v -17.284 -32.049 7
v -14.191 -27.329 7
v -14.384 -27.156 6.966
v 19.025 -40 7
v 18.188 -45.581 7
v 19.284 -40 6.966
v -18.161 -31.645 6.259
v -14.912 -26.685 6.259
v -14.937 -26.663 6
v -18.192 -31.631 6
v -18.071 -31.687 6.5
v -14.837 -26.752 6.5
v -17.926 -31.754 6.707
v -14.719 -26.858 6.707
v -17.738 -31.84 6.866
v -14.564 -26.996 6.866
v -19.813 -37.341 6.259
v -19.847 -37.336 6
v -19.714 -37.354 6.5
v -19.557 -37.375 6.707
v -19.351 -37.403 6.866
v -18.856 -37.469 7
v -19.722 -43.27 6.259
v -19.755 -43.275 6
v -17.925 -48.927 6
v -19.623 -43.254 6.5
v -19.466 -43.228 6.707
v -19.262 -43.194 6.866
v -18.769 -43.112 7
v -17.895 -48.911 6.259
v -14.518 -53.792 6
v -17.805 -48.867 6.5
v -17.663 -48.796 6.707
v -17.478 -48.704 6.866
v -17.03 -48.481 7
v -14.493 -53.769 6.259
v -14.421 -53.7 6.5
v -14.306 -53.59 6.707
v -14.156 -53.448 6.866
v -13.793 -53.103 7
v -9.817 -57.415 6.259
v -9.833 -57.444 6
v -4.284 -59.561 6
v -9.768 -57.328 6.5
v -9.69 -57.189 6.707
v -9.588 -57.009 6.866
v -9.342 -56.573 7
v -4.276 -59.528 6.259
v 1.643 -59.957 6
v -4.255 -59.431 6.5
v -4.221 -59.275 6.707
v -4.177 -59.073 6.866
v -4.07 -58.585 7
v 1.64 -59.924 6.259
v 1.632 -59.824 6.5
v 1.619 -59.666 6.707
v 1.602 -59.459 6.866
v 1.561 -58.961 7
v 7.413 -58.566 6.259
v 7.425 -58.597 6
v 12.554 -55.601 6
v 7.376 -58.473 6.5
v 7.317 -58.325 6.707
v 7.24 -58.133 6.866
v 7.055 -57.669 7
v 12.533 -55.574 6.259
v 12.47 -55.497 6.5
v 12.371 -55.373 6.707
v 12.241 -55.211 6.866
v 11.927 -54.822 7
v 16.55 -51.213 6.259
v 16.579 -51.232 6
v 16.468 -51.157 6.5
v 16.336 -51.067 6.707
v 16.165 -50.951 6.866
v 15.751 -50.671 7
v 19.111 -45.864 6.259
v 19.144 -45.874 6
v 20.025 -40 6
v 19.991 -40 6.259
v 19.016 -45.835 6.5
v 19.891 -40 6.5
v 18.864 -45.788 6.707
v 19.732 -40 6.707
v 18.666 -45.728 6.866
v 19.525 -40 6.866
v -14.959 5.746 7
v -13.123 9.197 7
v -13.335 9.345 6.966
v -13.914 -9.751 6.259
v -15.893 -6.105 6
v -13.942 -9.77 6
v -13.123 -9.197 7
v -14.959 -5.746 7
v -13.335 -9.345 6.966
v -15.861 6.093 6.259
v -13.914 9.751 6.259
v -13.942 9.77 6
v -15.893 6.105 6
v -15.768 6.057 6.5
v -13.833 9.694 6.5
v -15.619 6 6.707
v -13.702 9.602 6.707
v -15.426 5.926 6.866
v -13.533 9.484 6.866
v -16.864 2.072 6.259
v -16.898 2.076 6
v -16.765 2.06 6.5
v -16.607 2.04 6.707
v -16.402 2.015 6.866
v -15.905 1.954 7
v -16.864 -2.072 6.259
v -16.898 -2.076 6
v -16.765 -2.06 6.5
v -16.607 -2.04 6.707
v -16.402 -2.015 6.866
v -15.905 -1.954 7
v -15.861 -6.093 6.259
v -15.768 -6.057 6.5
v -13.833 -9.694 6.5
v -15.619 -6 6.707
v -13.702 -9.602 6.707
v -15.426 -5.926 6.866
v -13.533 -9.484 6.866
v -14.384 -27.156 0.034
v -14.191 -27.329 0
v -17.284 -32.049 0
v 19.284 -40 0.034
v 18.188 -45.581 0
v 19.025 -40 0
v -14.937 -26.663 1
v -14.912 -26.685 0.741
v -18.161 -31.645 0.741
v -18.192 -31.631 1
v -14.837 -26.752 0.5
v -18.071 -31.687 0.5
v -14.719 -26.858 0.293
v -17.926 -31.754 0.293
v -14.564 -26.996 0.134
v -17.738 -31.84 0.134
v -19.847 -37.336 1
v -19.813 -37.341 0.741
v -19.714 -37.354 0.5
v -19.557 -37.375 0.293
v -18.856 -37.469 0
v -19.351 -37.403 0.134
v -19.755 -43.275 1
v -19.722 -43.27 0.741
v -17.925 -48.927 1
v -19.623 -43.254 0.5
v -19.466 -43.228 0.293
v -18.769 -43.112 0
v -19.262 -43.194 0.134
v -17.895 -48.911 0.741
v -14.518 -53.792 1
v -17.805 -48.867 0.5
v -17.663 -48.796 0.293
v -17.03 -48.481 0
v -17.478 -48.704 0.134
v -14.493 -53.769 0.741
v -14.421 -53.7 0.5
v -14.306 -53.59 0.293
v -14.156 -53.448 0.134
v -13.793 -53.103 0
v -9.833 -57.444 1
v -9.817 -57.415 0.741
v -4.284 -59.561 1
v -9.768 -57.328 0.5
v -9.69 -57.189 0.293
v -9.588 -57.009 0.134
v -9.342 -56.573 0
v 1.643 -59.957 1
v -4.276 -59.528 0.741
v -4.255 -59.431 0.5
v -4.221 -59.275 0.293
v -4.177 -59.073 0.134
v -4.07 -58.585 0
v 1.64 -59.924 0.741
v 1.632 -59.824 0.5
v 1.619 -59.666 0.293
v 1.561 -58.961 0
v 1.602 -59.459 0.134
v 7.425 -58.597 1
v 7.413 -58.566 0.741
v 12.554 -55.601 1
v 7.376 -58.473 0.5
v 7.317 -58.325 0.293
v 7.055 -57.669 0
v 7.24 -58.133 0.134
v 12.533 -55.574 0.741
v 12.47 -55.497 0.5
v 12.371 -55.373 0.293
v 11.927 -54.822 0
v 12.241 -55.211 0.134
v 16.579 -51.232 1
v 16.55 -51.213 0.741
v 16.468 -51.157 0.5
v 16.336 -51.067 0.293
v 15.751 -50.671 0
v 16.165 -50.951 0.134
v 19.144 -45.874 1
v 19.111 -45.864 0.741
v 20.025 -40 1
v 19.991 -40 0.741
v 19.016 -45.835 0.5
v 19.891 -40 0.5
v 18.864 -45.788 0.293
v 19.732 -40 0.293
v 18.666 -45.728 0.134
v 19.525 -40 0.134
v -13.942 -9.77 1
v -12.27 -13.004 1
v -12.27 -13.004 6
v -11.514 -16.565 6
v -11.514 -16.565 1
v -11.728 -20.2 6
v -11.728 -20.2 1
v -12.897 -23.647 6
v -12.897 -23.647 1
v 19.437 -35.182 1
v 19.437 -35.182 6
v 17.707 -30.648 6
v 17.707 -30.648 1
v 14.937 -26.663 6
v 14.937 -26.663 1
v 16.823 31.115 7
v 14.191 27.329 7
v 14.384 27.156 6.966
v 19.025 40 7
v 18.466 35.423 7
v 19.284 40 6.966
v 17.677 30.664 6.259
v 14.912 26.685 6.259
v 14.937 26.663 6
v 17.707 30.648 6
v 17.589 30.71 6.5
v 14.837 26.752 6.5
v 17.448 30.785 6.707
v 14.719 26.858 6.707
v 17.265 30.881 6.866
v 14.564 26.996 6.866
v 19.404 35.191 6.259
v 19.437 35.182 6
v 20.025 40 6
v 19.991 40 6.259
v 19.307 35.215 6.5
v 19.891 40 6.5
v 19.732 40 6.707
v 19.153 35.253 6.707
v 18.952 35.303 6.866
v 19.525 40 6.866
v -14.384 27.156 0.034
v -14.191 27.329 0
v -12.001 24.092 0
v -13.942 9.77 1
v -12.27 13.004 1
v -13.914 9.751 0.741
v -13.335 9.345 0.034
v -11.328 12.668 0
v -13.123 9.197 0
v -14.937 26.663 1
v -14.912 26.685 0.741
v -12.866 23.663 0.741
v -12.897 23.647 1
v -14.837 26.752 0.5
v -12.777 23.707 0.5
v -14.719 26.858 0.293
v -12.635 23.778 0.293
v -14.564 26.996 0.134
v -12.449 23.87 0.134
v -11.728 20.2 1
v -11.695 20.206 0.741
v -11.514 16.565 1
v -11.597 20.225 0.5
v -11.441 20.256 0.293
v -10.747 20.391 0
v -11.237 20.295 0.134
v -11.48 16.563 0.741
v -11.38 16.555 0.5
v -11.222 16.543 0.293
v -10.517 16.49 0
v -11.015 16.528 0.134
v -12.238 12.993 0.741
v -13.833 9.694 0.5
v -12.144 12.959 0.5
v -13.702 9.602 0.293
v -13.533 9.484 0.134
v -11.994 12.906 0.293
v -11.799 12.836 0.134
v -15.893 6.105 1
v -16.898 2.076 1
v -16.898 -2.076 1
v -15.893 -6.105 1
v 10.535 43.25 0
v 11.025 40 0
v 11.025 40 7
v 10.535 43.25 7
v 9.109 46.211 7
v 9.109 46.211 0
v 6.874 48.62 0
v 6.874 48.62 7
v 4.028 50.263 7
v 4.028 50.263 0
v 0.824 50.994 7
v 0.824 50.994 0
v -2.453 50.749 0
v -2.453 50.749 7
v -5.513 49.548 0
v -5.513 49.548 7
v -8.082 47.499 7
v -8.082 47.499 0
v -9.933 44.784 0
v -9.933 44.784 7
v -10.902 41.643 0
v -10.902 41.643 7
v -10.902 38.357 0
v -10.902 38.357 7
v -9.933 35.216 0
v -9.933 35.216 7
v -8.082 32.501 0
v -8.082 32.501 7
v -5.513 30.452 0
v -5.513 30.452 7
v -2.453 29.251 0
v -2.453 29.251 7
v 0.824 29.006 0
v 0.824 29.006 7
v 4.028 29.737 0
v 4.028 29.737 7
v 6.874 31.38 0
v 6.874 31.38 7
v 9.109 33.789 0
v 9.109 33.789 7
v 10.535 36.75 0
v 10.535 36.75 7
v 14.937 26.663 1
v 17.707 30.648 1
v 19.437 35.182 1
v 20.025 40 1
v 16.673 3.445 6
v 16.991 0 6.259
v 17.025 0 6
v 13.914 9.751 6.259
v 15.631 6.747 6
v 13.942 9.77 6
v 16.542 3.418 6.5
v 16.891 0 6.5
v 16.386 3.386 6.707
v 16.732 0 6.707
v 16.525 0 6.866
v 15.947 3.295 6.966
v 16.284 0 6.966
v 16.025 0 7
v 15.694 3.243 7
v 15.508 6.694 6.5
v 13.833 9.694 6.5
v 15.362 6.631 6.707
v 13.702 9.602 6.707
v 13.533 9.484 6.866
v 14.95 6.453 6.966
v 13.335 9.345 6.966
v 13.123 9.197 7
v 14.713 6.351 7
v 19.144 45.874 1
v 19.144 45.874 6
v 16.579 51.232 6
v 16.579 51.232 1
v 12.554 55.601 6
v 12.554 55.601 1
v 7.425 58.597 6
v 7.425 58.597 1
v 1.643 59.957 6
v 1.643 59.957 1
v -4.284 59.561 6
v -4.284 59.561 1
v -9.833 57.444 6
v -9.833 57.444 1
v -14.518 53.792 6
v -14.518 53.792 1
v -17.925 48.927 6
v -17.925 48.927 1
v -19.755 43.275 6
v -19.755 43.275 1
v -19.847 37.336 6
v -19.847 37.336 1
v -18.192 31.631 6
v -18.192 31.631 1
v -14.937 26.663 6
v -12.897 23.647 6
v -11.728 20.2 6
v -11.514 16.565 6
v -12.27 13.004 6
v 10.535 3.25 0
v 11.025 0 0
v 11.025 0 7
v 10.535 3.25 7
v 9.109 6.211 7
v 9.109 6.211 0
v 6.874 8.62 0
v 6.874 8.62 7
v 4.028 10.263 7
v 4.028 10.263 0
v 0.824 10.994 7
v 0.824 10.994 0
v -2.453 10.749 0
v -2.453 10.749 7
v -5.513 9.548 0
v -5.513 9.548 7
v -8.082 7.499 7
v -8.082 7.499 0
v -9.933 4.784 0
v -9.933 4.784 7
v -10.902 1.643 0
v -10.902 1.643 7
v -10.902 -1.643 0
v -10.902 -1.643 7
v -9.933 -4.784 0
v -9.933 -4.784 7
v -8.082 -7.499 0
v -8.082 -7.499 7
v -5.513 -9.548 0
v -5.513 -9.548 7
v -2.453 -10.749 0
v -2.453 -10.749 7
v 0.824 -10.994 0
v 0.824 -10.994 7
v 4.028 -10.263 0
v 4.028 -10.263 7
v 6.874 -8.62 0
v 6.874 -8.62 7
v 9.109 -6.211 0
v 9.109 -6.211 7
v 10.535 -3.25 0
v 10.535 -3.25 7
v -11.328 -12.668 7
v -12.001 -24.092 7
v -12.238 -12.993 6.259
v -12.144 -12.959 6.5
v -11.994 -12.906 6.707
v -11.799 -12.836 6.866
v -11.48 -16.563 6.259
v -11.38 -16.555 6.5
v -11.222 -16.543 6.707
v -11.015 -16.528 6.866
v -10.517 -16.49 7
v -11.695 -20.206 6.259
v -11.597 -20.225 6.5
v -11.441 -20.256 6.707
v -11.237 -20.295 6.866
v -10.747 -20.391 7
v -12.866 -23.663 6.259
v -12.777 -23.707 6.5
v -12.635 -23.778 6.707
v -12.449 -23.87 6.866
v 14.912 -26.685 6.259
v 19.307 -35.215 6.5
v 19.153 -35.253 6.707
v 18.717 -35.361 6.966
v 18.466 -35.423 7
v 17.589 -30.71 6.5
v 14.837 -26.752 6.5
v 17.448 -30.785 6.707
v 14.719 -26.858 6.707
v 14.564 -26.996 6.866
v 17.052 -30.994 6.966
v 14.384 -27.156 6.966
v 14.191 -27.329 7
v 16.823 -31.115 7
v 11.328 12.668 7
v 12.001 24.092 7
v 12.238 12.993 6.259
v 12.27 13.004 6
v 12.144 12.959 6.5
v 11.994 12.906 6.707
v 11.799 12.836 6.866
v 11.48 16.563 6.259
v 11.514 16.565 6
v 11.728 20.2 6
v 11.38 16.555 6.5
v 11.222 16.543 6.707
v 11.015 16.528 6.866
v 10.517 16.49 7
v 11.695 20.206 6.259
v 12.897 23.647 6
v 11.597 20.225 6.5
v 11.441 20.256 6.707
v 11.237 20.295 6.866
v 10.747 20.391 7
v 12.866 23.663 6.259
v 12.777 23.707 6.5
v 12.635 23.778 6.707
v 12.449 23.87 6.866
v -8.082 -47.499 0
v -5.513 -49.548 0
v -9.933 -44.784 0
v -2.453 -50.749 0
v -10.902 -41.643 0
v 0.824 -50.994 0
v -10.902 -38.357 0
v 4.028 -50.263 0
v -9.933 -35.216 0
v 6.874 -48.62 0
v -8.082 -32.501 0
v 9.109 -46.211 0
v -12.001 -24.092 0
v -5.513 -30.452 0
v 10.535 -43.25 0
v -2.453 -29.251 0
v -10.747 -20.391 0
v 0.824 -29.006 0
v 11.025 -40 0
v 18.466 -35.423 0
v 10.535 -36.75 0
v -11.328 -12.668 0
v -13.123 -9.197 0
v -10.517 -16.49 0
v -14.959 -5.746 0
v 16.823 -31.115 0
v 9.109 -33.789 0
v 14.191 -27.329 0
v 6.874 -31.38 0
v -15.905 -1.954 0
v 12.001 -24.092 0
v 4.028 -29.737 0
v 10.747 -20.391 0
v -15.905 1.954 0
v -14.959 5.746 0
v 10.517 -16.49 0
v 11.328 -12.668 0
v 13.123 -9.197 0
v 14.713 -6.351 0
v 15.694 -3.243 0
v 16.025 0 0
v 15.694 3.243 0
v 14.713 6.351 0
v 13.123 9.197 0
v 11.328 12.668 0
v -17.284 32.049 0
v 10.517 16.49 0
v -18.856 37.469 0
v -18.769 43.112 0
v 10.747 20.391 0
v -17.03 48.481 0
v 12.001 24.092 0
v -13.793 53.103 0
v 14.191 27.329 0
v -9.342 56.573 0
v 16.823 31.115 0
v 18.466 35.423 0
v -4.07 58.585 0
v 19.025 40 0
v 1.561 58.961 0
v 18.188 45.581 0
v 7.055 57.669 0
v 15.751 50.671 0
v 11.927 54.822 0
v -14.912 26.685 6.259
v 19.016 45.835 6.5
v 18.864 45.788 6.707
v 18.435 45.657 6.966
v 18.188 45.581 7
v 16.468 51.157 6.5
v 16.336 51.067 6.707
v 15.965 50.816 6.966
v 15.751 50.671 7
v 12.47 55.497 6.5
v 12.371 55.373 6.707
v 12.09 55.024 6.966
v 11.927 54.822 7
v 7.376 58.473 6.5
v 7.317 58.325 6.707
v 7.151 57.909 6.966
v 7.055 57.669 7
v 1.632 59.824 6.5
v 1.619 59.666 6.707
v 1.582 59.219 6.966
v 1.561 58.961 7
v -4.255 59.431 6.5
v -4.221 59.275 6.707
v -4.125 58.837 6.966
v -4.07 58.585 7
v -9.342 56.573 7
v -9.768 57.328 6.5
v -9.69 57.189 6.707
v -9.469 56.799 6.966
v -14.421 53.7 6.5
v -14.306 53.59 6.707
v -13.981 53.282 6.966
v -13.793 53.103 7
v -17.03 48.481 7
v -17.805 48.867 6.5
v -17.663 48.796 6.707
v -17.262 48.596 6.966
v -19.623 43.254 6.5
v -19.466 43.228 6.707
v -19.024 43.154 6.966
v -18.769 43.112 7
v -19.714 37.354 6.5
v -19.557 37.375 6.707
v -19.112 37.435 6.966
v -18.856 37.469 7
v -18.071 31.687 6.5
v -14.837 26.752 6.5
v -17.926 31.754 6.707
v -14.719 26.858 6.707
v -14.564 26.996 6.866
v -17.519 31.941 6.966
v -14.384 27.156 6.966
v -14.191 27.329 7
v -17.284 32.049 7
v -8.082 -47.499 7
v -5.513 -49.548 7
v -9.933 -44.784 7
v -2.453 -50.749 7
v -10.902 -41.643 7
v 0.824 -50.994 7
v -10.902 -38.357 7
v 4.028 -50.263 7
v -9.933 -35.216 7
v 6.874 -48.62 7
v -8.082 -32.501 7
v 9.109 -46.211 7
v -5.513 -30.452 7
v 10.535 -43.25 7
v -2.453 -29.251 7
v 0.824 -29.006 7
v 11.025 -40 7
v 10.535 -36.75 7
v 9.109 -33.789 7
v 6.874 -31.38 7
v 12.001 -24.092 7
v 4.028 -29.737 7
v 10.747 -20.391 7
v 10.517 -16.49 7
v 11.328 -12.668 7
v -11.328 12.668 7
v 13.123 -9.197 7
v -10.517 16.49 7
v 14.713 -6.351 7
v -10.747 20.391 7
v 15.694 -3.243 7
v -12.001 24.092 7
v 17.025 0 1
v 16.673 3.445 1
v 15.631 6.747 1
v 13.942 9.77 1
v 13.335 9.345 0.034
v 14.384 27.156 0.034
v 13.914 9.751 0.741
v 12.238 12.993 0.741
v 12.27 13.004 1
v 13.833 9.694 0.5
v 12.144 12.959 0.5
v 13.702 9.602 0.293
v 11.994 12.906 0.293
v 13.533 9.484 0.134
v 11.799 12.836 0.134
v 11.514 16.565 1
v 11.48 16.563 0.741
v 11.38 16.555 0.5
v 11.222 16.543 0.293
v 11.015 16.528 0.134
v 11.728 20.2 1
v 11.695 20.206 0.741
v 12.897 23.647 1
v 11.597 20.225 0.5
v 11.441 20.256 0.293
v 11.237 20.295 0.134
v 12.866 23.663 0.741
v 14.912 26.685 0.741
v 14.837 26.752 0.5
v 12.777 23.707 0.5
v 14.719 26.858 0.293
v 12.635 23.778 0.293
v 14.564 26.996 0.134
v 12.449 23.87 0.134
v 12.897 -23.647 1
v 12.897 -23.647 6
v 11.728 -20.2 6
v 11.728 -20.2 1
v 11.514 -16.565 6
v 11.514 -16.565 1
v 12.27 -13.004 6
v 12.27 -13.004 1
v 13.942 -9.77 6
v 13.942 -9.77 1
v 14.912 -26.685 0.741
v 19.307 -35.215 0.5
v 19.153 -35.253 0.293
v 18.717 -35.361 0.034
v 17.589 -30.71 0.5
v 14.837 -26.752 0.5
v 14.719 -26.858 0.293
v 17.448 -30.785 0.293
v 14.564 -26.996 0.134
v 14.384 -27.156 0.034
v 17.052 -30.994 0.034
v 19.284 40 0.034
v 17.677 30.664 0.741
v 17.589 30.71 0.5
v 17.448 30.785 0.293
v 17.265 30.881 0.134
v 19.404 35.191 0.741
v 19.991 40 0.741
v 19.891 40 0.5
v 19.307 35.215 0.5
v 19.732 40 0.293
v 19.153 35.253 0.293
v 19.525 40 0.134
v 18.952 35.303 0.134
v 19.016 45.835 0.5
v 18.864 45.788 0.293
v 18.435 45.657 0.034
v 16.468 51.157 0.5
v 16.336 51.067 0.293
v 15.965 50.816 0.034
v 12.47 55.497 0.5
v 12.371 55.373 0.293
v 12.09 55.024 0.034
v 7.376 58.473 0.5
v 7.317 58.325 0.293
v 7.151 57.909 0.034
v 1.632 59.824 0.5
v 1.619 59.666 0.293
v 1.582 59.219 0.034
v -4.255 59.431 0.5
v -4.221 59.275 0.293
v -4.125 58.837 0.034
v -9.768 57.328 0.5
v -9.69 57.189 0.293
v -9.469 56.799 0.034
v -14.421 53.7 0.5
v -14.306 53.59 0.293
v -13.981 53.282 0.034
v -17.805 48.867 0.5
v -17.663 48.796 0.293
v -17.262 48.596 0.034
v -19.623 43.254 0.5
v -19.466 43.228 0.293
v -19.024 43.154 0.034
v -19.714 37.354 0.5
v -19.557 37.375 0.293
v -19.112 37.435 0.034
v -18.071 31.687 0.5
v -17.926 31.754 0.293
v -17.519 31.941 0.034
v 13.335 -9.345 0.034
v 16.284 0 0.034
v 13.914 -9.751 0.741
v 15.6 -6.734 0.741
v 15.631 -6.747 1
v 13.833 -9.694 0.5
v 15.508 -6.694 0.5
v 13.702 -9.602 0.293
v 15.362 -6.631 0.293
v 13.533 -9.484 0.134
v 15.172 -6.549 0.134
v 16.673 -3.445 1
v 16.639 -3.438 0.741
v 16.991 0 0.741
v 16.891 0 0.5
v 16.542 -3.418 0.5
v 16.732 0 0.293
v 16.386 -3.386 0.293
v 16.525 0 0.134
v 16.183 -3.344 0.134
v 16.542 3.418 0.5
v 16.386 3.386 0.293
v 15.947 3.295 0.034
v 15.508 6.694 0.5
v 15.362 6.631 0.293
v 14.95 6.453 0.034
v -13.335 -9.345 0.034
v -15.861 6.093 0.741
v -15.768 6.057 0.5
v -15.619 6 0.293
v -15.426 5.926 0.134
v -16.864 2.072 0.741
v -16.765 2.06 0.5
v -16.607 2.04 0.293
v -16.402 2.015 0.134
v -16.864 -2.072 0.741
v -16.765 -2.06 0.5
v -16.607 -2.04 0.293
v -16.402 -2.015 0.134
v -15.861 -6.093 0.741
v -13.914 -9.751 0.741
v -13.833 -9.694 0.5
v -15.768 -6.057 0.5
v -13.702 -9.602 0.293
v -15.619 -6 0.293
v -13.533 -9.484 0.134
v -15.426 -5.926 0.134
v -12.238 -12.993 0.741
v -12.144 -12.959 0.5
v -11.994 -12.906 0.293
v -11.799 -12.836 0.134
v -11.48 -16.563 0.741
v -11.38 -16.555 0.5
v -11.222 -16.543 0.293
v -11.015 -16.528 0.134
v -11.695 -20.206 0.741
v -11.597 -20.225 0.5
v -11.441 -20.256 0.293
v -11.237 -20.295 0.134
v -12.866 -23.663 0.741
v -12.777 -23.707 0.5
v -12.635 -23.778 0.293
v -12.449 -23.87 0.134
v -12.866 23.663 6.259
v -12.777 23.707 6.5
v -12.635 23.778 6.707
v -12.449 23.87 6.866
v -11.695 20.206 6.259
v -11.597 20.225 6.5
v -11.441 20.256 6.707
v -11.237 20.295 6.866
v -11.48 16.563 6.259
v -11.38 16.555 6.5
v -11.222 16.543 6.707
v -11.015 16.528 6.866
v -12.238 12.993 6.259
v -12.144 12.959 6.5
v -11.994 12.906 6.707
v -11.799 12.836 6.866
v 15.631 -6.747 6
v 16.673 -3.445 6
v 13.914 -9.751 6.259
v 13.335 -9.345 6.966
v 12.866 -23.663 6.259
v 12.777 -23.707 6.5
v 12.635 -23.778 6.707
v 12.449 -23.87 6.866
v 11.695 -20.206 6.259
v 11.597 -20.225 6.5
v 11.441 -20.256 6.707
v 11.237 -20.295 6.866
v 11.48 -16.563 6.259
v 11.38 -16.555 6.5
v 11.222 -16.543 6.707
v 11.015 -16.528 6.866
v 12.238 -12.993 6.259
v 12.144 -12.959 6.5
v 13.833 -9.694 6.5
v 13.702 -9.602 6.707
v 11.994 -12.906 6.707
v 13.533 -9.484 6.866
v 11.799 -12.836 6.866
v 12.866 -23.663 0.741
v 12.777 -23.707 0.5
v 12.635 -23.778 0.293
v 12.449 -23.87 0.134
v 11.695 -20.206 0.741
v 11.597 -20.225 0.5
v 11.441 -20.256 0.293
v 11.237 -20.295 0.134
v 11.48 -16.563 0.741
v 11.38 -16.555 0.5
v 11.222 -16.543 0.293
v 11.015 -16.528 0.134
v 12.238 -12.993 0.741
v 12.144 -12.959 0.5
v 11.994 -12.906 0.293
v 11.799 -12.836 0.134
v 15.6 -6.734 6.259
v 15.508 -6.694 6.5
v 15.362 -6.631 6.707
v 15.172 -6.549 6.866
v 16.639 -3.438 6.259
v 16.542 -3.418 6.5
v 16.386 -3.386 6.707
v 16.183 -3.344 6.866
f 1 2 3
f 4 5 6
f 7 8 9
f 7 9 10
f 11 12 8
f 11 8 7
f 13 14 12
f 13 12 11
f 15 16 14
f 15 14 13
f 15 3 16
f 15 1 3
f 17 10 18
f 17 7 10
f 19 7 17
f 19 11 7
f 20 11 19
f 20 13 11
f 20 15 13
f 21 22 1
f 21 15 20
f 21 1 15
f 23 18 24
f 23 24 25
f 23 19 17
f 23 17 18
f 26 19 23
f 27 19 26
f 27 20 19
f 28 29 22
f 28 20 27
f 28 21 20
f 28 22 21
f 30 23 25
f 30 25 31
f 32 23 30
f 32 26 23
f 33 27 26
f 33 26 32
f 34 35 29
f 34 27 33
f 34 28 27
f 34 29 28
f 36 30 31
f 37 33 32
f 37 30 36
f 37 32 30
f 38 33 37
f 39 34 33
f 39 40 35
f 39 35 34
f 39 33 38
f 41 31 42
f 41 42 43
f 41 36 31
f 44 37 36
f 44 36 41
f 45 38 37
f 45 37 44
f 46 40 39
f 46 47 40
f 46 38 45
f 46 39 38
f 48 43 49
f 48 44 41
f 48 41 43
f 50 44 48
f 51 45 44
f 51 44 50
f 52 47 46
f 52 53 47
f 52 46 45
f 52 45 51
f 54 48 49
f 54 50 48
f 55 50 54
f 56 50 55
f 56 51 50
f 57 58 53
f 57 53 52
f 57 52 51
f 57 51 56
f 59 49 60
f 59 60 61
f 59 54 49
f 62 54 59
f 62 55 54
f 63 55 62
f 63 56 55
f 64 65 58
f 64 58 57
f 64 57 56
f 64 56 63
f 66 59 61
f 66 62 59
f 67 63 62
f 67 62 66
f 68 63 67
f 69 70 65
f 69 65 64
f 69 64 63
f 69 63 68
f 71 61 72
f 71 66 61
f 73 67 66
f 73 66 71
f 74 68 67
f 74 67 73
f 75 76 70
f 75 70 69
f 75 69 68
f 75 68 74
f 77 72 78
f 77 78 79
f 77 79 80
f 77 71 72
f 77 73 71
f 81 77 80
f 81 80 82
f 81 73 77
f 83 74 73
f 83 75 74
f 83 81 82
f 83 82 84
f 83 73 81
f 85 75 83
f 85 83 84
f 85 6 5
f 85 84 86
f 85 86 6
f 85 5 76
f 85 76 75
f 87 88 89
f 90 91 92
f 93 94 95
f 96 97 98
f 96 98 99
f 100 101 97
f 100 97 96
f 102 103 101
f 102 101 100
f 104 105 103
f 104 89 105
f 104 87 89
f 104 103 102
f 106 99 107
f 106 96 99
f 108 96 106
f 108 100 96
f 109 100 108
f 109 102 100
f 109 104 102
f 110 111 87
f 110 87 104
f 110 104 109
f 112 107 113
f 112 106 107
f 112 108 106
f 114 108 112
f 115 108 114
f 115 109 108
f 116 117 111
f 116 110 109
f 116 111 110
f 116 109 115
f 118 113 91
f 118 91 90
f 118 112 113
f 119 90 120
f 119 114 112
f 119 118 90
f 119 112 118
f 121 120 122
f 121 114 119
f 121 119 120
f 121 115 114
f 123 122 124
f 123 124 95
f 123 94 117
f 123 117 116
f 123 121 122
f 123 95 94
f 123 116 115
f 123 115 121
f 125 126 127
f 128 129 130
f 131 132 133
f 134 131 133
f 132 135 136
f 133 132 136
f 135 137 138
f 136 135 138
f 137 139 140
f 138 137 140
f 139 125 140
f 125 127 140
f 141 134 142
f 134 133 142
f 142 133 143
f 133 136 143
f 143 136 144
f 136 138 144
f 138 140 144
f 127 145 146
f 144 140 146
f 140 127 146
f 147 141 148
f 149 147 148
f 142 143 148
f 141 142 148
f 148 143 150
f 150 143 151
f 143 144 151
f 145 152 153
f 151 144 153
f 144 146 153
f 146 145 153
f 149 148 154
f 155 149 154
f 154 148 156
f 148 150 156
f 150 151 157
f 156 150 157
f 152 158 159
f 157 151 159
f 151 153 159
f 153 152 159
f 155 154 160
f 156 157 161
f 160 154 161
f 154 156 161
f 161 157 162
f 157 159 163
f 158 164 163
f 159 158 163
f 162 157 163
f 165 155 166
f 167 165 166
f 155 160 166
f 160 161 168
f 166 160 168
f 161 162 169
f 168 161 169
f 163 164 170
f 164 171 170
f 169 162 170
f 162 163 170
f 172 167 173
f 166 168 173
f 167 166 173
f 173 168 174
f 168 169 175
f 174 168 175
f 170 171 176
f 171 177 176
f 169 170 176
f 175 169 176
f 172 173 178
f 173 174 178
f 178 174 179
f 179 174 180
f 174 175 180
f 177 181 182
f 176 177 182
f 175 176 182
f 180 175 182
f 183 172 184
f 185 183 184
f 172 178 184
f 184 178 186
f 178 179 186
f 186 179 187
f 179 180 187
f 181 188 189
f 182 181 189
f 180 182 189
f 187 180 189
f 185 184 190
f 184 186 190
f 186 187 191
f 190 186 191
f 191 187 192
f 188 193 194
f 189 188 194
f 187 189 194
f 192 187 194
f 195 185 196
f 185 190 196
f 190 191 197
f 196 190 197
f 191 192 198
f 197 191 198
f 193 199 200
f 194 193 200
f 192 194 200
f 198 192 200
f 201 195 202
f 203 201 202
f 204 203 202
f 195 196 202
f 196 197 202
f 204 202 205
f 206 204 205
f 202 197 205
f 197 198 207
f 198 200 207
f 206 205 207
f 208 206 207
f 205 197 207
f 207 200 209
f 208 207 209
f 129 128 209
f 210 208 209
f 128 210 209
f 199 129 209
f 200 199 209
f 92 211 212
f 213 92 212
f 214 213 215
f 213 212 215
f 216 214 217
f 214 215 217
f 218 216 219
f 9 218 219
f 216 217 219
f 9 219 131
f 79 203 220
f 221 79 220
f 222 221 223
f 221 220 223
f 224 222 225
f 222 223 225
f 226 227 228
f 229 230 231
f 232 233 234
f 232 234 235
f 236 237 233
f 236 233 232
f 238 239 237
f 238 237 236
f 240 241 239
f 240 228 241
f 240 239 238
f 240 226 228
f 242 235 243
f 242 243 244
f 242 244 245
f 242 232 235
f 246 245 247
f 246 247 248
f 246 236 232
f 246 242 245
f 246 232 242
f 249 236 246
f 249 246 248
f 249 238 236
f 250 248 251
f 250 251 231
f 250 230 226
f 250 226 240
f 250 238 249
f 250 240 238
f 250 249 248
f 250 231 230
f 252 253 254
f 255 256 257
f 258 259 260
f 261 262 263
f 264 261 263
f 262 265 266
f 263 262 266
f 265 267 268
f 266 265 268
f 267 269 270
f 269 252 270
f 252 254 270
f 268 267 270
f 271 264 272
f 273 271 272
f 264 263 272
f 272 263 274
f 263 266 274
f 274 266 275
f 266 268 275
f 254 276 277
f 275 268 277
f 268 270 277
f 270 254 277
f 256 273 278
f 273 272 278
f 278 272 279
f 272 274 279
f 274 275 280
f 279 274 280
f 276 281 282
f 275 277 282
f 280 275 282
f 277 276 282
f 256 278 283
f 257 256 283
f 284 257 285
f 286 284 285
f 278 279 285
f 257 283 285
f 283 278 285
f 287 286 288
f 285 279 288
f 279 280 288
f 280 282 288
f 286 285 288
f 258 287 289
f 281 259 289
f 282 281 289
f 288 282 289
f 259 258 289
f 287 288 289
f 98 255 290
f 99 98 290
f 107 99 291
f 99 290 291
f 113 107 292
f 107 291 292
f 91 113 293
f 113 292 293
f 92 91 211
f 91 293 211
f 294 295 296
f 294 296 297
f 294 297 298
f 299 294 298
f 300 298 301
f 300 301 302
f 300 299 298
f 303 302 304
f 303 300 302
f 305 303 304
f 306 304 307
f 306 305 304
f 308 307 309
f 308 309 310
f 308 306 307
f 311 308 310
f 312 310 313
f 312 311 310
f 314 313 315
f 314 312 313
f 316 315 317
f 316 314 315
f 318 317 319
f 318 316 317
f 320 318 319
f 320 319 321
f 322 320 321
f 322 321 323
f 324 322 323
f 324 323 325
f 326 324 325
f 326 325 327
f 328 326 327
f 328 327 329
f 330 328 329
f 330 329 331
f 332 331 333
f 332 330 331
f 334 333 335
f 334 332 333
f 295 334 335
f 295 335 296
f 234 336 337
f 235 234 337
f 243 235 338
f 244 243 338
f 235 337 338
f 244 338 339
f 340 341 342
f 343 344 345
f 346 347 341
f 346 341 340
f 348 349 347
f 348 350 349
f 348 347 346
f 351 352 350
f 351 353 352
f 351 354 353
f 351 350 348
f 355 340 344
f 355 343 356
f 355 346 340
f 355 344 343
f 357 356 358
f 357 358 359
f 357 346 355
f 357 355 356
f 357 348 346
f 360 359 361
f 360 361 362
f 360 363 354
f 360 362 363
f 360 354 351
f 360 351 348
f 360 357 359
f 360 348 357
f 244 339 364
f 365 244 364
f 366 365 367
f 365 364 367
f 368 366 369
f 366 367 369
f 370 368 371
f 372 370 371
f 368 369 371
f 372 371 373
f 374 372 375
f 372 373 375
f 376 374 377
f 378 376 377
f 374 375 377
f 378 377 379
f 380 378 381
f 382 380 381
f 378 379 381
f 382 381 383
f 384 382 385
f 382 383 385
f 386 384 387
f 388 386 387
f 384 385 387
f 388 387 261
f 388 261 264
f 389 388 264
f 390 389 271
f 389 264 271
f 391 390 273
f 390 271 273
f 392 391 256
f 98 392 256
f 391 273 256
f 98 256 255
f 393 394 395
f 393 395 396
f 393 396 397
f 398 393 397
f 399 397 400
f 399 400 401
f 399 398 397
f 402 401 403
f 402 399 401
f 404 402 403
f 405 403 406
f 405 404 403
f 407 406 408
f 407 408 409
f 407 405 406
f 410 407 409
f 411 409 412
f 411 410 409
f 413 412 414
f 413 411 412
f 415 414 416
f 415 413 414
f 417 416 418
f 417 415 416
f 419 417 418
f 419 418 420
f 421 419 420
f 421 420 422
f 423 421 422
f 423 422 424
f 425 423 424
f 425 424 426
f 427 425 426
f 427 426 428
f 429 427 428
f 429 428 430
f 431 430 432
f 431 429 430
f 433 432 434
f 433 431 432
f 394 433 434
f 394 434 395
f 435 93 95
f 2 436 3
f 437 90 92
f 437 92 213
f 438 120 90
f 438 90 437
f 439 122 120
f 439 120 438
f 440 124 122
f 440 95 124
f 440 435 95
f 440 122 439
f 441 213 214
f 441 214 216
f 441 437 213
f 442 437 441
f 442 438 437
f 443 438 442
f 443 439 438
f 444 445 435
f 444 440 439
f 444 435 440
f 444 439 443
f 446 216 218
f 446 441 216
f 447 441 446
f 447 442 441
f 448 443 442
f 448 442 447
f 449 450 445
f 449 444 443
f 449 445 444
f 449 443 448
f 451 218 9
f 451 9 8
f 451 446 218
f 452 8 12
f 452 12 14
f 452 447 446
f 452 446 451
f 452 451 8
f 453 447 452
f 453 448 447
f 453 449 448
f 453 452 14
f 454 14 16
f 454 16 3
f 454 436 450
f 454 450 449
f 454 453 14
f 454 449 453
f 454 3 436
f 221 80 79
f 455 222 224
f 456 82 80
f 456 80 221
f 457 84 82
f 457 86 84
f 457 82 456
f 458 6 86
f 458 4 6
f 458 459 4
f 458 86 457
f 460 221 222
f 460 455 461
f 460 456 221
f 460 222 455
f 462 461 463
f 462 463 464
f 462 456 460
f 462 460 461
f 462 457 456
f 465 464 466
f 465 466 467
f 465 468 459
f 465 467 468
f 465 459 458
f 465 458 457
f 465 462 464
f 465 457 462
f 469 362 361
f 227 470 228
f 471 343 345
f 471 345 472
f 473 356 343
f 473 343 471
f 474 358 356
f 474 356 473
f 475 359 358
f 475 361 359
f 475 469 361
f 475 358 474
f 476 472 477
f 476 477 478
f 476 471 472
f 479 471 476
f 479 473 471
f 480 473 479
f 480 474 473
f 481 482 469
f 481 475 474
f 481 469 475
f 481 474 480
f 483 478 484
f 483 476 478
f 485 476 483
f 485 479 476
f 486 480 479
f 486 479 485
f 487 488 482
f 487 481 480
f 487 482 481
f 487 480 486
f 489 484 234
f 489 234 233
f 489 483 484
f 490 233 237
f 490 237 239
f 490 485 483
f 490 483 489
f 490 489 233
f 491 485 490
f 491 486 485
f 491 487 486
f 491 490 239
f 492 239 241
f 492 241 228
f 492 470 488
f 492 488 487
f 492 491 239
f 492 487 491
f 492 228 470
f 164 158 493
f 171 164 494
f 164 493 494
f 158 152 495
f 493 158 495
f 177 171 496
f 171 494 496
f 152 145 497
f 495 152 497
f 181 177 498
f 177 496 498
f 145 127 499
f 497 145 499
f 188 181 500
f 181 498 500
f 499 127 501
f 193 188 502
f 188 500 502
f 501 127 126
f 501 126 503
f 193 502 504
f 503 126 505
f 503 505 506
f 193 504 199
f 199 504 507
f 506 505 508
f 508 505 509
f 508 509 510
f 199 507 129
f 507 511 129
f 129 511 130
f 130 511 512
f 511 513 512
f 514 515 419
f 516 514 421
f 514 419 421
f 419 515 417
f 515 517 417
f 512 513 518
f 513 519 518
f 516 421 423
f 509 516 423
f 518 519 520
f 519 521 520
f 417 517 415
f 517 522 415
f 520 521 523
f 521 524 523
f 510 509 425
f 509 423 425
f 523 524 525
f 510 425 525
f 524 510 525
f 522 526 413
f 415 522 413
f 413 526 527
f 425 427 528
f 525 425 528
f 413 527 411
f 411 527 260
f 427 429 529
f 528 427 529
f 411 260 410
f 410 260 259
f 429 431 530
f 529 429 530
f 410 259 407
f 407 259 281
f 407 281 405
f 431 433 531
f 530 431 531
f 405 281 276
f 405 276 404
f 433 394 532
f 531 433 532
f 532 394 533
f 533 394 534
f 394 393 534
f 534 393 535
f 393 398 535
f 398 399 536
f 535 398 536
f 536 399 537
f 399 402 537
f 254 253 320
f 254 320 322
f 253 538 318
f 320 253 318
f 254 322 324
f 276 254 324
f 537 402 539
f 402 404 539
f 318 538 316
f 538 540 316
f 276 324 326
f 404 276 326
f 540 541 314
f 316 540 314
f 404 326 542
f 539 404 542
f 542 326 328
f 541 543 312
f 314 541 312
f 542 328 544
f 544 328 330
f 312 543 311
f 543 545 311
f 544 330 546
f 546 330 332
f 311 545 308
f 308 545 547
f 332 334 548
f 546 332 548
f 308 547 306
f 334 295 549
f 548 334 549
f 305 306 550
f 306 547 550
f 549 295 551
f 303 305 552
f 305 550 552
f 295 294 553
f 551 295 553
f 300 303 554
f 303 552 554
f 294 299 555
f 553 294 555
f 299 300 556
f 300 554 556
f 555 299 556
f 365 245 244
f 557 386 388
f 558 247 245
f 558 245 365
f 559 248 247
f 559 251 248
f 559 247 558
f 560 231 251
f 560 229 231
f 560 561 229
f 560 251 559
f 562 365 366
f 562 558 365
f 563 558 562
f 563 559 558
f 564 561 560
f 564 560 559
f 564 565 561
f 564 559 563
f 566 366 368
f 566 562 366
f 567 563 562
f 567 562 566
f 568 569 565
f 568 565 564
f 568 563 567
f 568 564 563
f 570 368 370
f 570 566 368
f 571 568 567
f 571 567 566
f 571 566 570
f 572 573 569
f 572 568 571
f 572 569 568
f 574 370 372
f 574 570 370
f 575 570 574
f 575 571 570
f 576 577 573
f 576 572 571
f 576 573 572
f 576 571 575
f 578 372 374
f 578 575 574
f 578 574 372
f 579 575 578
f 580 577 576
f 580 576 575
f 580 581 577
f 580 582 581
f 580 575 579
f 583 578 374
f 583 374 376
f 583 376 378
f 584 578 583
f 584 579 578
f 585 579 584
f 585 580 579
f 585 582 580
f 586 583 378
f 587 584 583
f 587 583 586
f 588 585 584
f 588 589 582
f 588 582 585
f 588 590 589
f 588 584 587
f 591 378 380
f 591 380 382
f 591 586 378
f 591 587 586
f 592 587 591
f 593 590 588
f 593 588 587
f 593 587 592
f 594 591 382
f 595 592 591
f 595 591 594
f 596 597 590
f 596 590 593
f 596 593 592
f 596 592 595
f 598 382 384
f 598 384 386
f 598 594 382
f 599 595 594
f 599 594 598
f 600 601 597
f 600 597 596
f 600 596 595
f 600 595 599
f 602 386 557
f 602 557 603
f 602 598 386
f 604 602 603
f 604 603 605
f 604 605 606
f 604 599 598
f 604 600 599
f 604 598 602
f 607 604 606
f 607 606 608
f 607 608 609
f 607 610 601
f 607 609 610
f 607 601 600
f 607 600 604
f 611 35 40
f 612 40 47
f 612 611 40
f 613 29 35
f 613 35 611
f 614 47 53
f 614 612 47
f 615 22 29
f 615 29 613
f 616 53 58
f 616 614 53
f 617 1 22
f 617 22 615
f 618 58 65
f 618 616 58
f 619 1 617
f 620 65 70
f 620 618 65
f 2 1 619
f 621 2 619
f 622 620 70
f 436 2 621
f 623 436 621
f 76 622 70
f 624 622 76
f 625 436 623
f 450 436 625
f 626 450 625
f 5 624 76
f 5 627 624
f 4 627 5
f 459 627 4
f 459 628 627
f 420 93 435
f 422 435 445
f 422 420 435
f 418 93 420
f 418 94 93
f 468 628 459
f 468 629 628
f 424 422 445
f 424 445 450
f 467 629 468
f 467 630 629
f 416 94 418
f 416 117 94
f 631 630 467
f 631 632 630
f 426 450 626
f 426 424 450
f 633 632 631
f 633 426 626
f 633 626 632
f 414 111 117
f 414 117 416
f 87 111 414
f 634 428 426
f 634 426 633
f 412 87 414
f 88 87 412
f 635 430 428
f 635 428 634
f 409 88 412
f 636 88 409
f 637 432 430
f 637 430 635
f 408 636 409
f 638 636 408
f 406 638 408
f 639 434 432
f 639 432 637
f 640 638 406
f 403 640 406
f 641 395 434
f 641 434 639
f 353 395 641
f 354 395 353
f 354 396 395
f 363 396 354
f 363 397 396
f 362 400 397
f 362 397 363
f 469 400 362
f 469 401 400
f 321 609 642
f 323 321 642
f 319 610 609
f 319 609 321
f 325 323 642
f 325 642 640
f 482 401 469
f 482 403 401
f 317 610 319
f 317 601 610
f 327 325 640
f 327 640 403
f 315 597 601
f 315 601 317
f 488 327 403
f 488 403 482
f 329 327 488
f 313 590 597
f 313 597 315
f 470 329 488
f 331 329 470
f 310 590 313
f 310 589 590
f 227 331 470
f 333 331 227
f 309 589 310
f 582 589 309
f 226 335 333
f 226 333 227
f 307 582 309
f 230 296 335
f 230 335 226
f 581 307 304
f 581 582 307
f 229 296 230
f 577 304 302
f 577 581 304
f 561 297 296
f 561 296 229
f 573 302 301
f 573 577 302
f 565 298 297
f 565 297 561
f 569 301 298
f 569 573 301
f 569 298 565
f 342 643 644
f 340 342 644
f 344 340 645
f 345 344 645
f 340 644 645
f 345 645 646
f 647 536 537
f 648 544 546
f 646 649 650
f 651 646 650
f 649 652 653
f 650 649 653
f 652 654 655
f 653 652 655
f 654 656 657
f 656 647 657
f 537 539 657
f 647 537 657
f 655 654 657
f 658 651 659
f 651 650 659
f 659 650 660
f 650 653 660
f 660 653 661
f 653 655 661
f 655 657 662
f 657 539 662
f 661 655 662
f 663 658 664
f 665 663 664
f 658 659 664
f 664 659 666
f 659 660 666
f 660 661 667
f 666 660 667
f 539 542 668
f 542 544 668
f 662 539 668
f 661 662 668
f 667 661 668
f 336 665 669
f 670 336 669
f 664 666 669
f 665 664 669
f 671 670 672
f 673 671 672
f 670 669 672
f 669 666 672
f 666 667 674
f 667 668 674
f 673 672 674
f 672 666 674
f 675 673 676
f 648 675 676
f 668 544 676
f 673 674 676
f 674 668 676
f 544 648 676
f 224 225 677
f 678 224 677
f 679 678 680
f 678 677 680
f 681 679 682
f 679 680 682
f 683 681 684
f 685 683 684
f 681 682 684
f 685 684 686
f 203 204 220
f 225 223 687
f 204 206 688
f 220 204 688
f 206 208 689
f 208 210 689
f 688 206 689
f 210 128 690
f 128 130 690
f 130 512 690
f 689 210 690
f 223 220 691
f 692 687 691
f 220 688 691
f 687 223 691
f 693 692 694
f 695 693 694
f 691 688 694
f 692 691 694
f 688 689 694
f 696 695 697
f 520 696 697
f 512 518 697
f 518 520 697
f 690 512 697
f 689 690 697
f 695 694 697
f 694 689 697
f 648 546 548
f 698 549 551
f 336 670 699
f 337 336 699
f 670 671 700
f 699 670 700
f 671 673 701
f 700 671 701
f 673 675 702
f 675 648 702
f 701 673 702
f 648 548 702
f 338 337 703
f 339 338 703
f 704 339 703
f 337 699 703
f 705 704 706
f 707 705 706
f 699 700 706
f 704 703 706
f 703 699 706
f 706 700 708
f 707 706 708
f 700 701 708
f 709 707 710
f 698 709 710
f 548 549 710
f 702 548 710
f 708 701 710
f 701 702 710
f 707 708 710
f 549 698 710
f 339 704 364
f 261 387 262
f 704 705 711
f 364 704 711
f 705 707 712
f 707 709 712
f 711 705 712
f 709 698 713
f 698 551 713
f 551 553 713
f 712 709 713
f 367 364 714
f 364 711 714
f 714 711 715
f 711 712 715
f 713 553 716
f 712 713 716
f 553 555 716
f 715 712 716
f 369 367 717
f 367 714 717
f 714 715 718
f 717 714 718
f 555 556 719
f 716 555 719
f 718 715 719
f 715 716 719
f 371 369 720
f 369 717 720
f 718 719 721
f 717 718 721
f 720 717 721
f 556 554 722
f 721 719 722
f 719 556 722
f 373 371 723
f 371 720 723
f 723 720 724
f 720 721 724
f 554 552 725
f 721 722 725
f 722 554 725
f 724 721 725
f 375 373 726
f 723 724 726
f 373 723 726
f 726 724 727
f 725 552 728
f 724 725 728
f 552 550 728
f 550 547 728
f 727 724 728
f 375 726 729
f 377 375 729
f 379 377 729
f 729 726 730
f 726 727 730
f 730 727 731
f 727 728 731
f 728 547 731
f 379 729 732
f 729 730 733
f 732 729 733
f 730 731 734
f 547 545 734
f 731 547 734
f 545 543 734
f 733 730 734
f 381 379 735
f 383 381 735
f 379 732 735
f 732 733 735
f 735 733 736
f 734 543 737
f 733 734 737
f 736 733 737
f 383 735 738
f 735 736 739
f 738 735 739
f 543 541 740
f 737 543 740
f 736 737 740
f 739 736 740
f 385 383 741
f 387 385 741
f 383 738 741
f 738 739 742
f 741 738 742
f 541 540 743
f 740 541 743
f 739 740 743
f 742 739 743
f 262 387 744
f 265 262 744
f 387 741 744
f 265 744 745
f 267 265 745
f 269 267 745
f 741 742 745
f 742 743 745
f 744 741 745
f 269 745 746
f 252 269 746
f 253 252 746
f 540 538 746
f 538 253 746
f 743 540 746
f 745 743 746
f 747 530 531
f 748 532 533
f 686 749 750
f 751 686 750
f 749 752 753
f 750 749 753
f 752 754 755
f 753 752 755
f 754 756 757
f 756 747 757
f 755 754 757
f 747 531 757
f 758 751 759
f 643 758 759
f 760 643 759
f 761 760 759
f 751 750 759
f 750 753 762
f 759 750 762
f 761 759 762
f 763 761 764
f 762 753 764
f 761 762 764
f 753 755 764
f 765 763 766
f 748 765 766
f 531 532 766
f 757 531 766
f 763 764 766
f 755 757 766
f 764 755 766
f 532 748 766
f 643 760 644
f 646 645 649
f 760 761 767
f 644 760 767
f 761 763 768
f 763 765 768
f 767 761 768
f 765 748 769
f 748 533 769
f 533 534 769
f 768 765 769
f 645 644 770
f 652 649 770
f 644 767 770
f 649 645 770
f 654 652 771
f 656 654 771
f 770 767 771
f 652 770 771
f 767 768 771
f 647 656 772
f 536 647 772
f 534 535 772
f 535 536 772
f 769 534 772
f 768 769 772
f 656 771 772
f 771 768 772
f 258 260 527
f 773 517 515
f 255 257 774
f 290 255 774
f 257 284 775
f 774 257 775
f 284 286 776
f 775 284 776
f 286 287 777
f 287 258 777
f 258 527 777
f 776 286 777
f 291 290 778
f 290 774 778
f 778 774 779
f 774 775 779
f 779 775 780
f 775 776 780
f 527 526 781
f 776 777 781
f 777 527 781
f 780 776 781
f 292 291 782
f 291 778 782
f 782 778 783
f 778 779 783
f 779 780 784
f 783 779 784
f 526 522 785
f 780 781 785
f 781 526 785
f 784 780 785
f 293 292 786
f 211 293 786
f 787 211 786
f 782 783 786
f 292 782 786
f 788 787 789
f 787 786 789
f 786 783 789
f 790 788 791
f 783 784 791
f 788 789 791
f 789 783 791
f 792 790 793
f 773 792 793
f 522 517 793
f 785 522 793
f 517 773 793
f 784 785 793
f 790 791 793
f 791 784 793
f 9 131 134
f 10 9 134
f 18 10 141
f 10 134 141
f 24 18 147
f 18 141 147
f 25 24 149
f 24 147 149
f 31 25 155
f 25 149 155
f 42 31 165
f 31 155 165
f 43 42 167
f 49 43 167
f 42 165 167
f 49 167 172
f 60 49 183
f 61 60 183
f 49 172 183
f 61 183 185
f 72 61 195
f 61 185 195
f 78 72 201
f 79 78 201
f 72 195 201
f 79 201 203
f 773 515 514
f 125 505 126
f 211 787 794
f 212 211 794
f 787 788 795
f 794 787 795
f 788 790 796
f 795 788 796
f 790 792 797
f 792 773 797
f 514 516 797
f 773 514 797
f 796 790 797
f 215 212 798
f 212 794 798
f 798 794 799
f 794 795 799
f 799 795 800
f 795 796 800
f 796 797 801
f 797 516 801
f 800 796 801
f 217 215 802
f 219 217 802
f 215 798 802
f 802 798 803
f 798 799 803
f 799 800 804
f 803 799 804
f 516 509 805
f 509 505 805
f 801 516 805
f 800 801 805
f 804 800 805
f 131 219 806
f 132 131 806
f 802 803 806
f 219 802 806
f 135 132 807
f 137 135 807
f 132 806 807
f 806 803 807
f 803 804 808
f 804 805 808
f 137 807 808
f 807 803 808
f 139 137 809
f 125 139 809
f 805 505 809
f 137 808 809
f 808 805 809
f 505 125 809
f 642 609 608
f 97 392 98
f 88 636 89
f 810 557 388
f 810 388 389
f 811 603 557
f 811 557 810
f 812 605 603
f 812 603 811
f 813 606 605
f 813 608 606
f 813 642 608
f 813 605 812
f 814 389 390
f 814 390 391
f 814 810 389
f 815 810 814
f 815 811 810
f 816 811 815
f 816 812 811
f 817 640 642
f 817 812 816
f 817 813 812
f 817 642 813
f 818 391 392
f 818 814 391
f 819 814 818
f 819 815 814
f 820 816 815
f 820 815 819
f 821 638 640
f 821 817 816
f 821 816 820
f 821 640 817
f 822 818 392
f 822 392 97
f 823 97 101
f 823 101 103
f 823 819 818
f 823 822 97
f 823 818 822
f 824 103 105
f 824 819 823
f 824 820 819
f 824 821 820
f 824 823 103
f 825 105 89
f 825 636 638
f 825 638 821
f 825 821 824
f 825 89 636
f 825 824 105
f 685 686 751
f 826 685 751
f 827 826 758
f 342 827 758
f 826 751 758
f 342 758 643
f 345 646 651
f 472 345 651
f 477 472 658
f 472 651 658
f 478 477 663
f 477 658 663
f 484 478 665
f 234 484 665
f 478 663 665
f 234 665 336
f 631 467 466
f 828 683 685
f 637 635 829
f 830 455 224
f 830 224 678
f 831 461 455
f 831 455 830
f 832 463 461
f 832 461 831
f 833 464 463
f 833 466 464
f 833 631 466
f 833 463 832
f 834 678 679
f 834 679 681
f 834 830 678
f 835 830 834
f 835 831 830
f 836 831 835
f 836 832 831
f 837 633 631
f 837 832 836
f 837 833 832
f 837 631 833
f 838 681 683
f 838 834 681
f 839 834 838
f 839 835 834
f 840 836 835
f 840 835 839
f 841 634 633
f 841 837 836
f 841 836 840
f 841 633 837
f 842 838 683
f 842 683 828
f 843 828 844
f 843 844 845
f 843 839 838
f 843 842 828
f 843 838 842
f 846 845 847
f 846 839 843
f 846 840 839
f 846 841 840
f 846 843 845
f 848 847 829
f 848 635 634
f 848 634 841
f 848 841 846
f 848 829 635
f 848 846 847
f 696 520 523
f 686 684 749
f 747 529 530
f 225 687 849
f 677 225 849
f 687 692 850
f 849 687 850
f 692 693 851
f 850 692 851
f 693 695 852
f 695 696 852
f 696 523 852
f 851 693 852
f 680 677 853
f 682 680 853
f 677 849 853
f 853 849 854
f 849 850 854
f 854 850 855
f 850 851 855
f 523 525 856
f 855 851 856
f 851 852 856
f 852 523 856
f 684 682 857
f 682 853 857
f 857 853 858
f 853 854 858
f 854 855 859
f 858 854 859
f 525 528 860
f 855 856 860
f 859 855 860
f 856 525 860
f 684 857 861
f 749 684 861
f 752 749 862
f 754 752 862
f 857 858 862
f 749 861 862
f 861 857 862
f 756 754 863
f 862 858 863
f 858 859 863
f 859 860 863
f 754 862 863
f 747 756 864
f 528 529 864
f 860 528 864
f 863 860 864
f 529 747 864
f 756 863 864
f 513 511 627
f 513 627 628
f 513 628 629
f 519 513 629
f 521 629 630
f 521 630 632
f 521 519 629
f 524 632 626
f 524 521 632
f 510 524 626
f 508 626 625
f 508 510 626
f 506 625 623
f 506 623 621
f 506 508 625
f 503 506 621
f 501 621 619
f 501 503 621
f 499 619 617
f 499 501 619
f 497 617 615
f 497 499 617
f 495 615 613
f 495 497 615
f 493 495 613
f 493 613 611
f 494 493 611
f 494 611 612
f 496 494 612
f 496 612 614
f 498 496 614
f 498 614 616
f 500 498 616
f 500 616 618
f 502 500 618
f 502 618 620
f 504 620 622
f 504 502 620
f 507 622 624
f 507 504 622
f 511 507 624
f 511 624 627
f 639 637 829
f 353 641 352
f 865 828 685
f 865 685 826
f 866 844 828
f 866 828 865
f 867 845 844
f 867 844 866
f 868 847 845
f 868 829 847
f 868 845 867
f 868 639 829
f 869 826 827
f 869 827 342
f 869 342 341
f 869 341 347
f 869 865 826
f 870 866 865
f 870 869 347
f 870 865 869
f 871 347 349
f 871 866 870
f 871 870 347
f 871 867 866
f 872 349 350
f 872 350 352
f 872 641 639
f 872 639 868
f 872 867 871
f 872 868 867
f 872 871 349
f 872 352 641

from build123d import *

# Parameters (mm, degrees)
F0_R     = 11.025
F1_DEPTH = 7
F2_R     = 1


# Not quite as in the source:
# - a feature names something its author has since deleted; it is built from what else it names


with BuildPart() as f1:
    # F0 (on Top) → F1 (new body)
    with BuildSketch(Plane.XY):
        with BuildLine():
            ThreePointArc((14.9370437515, 26.6626333571), (18.7098226358, 32.8625521411), (20.025, 40))
            ThreePointArc((20.025, 40), (-7.1374478589, 58.7098226358), (-14.9370437515, 26.6626333571))
            ThreePointArc((-14.9370437515, 26.6626333571), (0, 19.975), (14.9370437515, 26.6626333571))
        make_face()
        with Locations((0, 40)):
            Circle(F0_R, mode=Mode.SUBTRACT)
        with BuildLine():
            ThreePointArc((14.9370437515, 26.6626333571), (0, 19.975), (-14.9370437515, 26.6626333571))
            ThreePointArc((-14.9370437515, 26.6626333571), (-11.4991266725, 18.3897005812), (-13.9423398463, 9.7704546778))
            ThreePointArc((-13.9423398463, 9.7704546778), (0, 17.025), (13.9423398463, 9.7704546778))
            ThreePointArc((13.9423398463, 9.7704546778), (11.4991266725, 18.3897005812), (14.9370437515, 26.6626333571))
        make_face()
        with BuildLine():
            ThreePointArc((13.9423398463, 9.7704546778), (0, 17.025), (-13.9423398463, 9.7704546778))
            ThreePointArc((-13.9423398463, 9.7704546778), (-17.025, 0), (-13.9423398463, -9.7704546778))
            ThreePointArc((-13.9423398463, -9.7704546778), (0, -17.025), (13.9423398463, -9.7704546778))
            ThreePointArc((13.9423398463, -9.7704546778), (16.2360549531, -5.1226111075), (17.025, 0))
            ThreePointArc((17.025, 0), (16.2360549531, 5.1226111075), (13.9423398463, 9.7704546778))
        make_face()
        Circle(F0_R, mode=Mode.SUBTRACT)
        with BuildLine():
            ThreePointArc((13.9423398463, -9.7704546778), (0, -17.025), (-13.9423398463, -9.7704546778))
            ThreePointArc((-13.9423398463, -9.7704546778), (-11.4991266725, -18.3897005812), (-14.9370437515, -26.6626333571))
            ThreePointArc((-14.9370437515, -26.6626333571), (0, -19.975), (14.9370437515, -26.6626333571))
            ThreePointArc((14.9370437515, -26.6626333571), (11.4991266725, -18.3897005812), (13.9423398463, -9.7704546778))
        make_face()
        with BuildLine():
            ThreePointArc((14.9370437515, -26.6626333571), (0, -19.975), (-14.9370437515, -26.6626333571))
            ThreePointArc((-14.9370437515, -26.6626333571), (-7.1374478589, -58.7098226358), (20.025, -40))
            ThreePointArc((20.025, -40), (18.7098226358, -32.8625521411), (14.9370437515, -26.6626333571))
        make_face()
        with Locations((0, -40)):
            Circle(F0_R, mode=Mode.SUBTRACT)
    extrude(amount=F1_DEPTH)

    # F2
    f2_edges = [f1.edges().sort_by_distance(p)[0] for p in [
        (14.937044, 26.662633, 3.5),
        (-14.937044, 26.662633, 3.5),
        (0, 60.025, 0),
        (0, 60.025, 7),
        (-13.94234, 9.770455, 3.5),
        (-11.499127, 18.389701, 0),
        (-11.499127, 18.389701, 7),
        (-13.94234, -9.770455, 3.5),
        (-14.937044, -26.662633, 3.5),
        (-11.499127, -18.389701, 0),
        (-11.499127, -18.389701, 7),
        (14.937044, -26.662633, 3.5),
        (0, -60.025, 0),
        (0, -60.025, 7),
    ]]
    fillet(f2_edges, radius=F2_R)


solid = f1.part
